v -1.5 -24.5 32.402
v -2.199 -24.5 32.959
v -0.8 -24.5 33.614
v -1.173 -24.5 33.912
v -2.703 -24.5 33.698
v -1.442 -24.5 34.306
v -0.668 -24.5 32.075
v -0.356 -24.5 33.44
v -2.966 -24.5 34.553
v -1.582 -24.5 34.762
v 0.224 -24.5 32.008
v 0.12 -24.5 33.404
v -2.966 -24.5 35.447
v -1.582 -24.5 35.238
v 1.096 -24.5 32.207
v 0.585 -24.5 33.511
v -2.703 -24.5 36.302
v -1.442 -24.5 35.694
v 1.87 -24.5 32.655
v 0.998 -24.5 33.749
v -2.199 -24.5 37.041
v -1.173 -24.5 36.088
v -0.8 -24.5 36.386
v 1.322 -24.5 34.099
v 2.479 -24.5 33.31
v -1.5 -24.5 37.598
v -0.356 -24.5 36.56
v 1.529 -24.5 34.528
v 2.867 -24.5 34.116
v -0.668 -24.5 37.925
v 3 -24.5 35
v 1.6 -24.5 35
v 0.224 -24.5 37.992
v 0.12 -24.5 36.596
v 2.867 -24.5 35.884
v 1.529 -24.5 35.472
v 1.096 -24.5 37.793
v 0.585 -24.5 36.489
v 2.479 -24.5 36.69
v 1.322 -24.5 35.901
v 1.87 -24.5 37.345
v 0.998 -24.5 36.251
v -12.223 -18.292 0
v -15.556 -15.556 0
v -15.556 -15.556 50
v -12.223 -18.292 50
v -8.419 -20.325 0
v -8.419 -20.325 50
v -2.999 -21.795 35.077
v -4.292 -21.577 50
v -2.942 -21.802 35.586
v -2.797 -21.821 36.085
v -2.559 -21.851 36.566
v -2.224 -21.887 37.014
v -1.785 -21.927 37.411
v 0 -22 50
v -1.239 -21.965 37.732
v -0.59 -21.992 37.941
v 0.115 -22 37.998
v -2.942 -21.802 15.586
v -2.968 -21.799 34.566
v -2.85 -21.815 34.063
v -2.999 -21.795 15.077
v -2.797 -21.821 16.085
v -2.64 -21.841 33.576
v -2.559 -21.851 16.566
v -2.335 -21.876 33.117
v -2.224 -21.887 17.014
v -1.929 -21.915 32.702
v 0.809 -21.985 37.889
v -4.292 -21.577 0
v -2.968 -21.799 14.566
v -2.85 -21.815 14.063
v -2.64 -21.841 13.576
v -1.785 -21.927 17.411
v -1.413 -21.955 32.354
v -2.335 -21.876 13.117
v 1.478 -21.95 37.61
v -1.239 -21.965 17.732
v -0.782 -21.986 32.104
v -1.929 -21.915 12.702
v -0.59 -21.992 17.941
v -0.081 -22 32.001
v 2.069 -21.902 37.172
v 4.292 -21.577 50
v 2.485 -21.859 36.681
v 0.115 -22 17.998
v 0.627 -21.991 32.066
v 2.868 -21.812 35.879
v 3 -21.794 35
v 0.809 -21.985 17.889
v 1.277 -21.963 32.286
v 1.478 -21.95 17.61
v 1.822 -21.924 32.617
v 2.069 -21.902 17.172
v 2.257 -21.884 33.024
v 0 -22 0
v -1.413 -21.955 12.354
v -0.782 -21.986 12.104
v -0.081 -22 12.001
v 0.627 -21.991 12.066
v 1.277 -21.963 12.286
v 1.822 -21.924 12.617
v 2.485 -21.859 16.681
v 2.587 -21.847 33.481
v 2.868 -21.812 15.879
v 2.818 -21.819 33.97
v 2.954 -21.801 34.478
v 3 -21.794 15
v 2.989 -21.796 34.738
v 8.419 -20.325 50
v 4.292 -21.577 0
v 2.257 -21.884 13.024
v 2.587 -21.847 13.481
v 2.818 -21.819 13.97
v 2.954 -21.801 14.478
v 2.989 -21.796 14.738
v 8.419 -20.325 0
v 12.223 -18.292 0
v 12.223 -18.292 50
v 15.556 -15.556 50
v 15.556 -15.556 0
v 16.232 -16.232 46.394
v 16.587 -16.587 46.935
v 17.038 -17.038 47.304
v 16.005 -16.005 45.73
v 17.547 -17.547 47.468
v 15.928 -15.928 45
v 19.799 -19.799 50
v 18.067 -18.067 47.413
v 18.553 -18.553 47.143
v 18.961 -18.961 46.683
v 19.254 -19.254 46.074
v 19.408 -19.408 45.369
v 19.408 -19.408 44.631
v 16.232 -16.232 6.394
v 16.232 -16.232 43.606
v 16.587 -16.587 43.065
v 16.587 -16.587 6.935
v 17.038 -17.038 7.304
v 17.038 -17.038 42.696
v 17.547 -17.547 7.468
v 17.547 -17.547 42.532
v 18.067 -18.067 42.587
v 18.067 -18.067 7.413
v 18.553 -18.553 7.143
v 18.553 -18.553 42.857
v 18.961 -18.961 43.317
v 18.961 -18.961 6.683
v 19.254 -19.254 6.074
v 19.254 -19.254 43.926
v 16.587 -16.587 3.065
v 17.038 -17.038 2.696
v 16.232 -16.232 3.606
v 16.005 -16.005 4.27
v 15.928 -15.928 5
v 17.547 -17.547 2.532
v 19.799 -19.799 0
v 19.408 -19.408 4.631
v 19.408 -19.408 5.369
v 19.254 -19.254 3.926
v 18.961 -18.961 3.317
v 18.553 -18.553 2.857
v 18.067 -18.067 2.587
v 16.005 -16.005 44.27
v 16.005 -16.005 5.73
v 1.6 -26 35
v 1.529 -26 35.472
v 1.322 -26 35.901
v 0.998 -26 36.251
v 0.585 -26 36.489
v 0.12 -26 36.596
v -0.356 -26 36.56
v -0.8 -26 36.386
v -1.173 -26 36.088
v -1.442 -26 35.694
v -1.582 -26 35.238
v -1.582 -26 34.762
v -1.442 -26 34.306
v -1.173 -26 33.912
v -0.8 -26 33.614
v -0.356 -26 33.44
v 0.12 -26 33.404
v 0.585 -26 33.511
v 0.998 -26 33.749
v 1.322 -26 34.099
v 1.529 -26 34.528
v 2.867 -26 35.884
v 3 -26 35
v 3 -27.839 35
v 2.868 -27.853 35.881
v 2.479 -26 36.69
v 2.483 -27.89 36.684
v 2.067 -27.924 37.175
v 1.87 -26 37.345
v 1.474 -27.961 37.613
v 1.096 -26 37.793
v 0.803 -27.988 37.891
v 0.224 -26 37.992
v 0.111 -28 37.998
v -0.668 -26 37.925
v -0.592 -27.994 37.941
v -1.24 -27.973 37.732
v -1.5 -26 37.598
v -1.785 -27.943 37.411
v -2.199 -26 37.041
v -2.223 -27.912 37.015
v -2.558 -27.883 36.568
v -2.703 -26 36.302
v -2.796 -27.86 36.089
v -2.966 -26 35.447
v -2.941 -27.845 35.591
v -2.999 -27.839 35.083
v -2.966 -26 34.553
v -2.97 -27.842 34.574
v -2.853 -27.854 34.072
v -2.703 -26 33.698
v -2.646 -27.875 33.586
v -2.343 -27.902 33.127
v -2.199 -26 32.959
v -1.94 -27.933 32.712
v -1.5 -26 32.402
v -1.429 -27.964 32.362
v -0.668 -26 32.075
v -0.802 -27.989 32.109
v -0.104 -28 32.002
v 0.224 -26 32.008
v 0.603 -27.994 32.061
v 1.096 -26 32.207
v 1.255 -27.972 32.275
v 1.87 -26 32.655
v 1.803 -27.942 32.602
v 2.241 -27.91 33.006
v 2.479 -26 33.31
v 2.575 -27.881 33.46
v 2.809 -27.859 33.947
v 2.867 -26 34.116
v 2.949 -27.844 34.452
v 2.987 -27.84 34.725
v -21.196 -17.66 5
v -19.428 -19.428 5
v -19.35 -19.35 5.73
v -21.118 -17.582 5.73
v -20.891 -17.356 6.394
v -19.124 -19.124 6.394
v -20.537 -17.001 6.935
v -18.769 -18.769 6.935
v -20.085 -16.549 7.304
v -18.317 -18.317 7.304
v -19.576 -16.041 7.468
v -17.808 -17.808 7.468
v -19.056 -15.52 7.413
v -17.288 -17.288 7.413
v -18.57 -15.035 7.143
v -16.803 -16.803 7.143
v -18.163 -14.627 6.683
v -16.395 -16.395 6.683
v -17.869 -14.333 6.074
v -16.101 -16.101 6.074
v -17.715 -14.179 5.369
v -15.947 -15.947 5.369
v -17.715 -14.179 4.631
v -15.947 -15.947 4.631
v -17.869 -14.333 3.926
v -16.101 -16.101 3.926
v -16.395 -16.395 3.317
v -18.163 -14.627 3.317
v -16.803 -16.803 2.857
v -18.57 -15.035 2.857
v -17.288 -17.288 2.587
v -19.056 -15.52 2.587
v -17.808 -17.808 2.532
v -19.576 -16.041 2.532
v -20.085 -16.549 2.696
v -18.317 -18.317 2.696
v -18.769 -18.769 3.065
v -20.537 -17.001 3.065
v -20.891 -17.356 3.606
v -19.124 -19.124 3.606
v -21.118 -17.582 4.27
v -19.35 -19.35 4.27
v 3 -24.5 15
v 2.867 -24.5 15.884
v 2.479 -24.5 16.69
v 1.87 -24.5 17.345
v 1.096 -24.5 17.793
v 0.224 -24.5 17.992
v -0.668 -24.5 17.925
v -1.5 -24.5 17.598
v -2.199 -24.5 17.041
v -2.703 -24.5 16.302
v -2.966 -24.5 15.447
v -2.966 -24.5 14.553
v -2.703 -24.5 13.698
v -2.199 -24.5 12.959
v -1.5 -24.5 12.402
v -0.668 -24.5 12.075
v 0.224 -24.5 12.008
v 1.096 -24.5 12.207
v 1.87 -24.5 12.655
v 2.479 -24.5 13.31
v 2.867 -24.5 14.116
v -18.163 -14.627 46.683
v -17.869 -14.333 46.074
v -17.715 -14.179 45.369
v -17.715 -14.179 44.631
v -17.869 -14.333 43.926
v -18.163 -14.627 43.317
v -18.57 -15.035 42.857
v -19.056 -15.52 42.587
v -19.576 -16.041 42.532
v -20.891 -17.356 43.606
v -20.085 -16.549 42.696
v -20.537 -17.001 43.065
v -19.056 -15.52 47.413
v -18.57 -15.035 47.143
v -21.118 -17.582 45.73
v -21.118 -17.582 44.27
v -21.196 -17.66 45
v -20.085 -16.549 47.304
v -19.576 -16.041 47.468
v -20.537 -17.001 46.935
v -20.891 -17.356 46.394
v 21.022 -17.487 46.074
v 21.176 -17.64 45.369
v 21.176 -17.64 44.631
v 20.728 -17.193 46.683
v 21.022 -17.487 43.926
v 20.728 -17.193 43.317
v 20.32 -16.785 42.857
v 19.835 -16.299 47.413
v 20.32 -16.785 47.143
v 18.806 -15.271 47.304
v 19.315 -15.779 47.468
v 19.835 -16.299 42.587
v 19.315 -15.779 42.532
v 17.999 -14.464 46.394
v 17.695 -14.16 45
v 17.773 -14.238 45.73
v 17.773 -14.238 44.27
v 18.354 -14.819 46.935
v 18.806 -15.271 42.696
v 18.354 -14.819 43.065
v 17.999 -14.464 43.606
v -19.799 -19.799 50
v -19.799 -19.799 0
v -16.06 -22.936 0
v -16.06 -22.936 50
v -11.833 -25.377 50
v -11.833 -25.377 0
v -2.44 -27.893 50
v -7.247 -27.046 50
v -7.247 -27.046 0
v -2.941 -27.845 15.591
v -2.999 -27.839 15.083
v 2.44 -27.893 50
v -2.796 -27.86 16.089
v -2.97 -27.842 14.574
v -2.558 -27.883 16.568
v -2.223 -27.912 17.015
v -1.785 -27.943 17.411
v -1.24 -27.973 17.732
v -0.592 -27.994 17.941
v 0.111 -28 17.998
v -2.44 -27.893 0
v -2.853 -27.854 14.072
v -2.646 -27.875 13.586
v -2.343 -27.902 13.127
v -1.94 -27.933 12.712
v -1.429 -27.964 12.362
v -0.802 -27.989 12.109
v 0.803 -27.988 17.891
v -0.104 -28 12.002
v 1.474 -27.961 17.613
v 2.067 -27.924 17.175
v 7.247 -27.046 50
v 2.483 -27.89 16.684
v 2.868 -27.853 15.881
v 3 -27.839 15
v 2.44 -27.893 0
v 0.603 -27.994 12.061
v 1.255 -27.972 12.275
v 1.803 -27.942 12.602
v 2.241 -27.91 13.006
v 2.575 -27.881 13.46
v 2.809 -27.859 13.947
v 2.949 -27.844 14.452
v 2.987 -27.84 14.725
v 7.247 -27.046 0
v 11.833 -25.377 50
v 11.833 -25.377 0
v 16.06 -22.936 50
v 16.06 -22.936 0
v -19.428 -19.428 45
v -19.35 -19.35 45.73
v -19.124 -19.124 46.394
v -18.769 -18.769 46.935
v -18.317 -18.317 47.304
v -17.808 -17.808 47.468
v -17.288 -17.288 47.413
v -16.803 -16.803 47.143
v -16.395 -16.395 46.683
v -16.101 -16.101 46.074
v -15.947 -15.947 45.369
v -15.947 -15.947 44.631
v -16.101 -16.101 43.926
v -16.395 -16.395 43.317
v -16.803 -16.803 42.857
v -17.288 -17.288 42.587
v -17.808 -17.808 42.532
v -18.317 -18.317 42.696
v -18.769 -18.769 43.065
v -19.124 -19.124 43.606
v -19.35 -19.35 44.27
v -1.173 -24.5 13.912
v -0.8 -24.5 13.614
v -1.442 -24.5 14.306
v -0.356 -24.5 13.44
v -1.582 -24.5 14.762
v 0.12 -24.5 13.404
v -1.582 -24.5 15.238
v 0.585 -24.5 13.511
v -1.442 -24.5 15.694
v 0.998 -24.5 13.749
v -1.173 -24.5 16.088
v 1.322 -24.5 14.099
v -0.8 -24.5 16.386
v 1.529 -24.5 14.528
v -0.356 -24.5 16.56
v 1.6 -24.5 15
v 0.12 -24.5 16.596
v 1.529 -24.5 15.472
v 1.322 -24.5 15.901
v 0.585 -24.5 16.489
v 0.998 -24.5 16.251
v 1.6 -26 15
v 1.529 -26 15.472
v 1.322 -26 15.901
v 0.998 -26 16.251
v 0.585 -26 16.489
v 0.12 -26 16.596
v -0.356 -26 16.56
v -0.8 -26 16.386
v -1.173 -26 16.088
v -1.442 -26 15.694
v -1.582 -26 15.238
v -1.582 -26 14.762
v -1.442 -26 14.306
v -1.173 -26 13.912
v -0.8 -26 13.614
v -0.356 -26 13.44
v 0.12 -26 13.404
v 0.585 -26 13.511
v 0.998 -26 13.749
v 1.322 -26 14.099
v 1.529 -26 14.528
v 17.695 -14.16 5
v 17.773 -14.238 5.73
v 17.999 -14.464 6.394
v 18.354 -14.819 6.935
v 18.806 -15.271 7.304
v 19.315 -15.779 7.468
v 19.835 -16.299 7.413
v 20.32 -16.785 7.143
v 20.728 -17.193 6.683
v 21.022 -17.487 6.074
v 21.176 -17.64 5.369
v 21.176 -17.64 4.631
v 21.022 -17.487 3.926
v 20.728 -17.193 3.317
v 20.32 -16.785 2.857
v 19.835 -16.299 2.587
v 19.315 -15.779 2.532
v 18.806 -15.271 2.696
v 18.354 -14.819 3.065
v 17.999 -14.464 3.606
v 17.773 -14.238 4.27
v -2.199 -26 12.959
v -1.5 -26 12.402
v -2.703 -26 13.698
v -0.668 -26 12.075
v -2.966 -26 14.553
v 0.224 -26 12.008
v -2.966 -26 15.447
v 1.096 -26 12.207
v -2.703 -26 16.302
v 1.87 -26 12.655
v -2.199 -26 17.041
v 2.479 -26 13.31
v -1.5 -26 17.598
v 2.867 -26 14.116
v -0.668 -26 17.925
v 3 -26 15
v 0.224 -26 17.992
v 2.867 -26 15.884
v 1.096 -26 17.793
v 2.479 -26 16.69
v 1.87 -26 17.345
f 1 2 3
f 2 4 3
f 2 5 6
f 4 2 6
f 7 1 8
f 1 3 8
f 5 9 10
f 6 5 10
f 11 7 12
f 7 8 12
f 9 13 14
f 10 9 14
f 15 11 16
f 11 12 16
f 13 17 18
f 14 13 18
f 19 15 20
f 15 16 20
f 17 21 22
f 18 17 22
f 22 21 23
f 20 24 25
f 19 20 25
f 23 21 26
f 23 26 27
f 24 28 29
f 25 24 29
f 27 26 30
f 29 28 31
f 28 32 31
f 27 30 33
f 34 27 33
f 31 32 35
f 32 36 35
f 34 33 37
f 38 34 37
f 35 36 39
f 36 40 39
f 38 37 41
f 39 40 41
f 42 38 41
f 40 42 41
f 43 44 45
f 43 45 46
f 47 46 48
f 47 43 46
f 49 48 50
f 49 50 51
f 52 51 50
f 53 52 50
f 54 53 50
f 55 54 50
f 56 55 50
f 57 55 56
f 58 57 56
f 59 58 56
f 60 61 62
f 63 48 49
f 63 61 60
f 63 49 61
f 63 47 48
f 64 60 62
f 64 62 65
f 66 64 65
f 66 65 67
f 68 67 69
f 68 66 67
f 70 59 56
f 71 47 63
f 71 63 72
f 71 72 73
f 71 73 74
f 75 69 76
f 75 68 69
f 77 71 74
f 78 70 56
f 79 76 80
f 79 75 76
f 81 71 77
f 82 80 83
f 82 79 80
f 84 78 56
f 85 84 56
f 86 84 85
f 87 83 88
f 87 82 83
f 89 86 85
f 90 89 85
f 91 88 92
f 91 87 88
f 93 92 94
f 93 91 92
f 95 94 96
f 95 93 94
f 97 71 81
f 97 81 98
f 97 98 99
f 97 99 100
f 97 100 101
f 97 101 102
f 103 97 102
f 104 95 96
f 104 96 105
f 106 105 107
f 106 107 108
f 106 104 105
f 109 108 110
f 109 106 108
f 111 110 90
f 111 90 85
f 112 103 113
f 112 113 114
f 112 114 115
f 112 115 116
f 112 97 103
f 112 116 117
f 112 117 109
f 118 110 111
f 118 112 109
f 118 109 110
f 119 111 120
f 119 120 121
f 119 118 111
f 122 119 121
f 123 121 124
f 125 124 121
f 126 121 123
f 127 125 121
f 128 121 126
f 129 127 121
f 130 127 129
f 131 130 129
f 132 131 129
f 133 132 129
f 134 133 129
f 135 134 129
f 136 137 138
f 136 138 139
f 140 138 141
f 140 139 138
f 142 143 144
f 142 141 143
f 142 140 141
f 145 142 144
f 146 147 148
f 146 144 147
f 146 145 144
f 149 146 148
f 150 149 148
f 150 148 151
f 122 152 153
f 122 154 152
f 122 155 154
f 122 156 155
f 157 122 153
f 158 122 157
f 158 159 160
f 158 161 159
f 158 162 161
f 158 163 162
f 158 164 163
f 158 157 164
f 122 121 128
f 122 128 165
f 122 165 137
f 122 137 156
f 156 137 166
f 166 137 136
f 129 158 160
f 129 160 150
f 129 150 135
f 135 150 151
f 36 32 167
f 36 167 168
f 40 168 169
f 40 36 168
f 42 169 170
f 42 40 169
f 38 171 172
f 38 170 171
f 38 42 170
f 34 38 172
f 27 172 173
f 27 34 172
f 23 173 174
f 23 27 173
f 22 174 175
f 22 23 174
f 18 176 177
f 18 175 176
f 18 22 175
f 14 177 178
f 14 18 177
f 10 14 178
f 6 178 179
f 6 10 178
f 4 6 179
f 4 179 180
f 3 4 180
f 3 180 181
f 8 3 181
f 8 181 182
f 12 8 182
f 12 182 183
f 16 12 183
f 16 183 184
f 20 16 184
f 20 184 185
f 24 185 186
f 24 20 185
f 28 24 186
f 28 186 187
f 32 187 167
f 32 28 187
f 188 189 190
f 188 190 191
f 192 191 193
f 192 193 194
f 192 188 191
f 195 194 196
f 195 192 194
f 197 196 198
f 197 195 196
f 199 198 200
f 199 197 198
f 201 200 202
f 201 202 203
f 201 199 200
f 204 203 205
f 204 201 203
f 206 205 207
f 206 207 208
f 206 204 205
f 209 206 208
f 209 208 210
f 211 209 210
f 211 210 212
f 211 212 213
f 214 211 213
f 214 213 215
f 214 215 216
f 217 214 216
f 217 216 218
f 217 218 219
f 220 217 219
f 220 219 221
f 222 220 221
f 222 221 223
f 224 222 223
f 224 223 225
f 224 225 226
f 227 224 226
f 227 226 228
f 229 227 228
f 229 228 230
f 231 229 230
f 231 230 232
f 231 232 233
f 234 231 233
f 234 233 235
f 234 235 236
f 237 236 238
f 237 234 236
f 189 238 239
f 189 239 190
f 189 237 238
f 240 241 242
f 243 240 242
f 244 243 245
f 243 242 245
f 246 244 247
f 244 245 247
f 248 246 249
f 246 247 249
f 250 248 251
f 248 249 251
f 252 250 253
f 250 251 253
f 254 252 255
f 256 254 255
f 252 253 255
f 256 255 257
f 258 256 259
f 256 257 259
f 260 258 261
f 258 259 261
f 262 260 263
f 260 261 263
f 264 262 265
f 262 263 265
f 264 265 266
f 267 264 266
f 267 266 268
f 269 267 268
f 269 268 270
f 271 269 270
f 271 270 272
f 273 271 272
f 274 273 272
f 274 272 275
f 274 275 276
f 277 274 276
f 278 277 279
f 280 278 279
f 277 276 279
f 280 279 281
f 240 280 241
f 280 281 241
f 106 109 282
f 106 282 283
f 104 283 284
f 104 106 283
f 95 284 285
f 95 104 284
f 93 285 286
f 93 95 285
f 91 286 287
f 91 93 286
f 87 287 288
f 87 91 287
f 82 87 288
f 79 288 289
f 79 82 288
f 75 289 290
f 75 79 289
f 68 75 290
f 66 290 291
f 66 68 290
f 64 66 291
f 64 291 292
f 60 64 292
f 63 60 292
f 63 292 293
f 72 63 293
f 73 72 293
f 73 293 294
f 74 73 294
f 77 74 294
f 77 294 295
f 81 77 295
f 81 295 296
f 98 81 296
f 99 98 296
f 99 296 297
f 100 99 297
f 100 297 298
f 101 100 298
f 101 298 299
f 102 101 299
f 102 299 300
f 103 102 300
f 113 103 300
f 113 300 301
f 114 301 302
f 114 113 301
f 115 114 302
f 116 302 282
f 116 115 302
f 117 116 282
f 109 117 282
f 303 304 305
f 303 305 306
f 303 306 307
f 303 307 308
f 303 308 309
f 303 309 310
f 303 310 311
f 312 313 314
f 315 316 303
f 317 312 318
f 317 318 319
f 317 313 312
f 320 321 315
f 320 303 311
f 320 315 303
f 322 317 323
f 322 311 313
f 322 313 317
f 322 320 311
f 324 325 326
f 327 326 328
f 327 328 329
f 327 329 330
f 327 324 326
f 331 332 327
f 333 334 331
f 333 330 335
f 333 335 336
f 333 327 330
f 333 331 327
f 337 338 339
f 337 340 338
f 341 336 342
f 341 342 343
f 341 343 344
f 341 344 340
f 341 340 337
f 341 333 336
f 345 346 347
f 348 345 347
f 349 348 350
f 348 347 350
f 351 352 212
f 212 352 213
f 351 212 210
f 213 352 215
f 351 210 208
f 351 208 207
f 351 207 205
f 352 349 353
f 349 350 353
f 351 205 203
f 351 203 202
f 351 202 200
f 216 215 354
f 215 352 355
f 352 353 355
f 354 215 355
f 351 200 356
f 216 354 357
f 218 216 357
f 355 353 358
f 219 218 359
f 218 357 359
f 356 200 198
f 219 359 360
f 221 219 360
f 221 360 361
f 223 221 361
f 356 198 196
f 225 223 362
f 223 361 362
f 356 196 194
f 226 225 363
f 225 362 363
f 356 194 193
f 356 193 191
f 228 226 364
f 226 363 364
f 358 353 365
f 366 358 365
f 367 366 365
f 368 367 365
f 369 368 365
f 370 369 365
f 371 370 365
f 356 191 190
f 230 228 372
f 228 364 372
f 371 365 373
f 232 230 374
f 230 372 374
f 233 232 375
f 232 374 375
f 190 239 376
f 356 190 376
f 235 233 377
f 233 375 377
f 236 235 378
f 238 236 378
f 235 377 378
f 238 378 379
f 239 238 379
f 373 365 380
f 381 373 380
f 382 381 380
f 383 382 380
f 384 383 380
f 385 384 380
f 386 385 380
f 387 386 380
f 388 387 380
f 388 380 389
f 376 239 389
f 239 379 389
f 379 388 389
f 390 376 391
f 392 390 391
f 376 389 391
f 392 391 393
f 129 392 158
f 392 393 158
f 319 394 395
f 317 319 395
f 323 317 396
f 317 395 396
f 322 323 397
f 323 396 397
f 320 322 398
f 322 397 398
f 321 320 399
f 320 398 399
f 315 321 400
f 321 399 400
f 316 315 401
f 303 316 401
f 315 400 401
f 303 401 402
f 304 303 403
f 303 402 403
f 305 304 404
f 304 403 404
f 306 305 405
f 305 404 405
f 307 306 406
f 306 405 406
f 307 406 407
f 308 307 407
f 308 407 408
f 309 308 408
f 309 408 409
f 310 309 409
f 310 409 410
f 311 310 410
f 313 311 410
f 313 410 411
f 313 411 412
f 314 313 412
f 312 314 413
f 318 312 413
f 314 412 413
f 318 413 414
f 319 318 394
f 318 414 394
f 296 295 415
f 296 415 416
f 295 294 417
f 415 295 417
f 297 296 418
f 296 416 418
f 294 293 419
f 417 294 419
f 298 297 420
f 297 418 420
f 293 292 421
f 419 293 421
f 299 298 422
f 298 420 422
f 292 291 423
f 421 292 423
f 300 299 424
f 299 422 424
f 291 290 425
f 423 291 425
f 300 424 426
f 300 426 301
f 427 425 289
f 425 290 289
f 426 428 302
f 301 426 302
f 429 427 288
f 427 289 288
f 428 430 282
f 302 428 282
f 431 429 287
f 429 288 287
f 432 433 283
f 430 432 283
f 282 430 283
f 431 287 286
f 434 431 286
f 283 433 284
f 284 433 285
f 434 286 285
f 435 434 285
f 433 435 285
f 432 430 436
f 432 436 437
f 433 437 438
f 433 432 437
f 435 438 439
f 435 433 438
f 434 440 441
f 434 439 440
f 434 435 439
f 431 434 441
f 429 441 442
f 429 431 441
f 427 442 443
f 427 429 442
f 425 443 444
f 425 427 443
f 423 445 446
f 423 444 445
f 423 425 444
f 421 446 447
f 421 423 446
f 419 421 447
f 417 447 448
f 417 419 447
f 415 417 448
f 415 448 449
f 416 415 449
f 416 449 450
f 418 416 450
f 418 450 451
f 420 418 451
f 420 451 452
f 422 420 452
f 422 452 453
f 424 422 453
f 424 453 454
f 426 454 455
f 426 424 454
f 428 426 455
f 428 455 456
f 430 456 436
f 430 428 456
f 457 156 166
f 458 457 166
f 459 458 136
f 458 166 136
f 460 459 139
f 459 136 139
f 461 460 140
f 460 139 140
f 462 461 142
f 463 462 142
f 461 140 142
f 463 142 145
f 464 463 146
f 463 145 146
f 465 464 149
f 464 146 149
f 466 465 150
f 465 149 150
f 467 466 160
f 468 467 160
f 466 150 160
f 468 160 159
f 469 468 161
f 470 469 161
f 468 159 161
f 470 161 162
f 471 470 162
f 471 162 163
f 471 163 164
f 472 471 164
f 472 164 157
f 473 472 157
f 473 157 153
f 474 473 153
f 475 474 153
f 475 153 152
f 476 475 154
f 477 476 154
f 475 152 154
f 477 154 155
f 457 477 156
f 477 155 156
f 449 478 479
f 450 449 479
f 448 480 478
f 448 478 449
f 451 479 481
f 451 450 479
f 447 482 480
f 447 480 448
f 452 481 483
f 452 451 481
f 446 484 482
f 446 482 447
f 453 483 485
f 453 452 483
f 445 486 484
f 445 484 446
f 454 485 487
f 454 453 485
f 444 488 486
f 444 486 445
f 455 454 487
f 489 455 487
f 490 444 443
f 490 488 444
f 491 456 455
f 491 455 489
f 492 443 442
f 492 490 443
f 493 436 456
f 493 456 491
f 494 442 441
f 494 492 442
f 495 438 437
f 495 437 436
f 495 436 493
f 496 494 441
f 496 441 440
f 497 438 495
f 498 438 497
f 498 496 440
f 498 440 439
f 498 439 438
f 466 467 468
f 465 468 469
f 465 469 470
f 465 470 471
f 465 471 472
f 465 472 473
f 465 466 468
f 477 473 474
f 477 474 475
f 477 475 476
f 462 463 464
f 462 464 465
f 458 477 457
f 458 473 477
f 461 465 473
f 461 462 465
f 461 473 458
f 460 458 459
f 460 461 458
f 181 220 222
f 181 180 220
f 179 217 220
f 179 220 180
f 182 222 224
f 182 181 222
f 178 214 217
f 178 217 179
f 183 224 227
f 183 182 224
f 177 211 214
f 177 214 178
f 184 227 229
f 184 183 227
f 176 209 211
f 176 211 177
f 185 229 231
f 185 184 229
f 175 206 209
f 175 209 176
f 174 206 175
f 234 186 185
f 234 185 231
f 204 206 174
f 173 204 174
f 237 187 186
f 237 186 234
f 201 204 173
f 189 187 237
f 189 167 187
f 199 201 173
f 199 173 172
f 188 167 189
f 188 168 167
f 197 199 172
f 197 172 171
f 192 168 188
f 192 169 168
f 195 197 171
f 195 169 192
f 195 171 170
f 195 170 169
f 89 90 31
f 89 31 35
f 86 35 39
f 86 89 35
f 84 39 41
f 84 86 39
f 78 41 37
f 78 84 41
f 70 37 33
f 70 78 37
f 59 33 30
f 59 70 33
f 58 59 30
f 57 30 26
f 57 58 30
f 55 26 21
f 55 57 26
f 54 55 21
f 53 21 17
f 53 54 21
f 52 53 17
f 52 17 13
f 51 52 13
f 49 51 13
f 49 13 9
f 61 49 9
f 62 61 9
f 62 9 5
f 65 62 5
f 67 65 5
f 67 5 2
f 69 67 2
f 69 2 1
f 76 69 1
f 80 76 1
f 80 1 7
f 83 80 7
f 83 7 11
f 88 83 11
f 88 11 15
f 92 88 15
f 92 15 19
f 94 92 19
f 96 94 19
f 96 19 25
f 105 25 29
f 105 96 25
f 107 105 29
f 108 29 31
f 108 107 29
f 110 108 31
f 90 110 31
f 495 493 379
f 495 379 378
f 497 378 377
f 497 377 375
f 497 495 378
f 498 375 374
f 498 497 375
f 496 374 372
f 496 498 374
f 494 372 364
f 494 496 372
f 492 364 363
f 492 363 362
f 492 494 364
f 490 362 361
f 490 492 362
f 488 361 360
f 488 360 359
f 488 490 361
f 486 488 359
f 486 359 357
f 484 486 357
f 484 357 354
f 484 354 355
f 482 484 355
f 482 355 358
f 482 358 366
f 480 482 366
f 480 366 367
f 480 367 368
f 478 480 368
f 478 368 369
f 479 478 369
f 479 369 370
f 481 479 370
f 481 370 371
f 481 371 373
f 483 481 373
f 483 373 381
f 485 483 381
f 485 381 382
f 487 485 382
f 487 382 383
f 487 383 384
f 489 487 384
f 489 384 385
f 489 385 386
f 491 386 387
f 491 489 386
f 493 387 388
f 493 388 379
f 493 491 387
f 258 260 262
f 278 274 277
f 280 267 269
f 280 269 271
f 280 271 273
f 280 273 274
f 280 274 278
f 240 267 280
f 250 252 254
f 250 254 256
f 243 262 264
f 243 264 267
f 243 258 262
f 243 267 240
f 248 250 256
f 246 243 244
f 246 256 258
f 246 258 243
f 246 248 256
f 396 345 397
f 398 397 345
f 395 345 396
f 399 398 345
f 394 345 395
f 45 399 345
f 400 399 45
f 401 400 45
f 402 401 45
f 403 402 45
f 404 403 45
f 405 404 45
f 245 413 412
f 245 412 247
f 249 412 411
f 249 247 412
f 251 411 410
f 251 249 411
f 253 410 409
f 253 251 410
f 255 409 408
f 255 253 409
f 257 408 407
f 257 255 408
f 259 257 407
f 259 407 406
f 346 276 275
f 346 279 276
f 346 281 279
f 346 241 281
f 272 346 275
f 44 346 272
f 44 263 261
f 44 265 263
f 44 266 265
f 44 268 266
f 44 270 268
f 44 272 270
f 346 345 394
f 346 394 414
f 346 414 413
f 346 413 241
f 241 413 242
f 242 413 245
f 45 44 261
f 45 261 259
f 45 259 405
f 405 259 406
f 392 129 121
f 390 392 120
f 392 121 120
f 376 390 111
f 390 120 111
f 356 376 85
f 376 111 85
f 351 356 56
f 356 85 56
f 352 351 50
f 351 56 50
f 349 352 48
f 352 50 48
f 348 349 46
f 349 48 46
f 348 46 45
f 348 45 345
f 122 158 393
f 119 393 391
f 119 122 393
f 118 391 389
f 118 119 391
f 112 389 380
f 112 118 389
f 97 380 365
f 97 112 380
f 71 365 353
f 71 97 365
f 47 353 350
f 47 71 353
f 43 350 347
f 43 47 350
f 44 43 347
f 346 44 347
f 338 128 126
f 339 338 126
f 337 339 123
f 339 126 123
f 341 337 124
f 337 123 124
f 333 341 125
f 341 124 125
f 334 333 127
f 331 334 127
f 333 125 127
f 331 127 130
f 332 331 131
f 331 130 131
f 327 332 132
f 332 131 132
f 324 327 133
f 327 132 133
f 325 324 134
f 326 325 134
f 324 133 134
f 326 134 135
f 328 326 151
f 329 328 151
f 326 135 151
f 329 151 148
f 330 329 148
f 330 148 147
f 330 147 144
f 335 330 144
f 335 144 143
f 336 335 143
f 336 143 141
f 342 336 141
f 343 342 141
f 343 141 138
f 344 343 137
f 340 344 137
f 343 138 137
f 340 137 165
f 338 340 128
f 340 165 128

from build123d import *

# Parameters (mm, degrees)
PAD_DEPTH            = 50
SKETCH001_R          = 2.475
PAD001_DEPTH         = 2.5
SKETCH002_R          = 2.475
PAD002_DEPTH         = 2.5
SKETCH003_R          = 3
POCKET_DEPTH         = 24.5
SKETCH004_R          = 1.6
POCKET001_DEPTH      = 0.001
POCKET001_DEPTH_BACK = 28.001
POCKET002_START      = 26
SKETCH005_R          = 3
POCKET002_DEPTH      = 42


with BuildPart() as part:
    # Sketch → Pad (new body)
    with BuildSketch(Plane.XY):
        with BuildLine():
            ThreePointArc((-15.556349, -15.556349), (0, -22), (15.556349, -15.556349))
            Line((15.556349, -15.556349), (19.79899, -19.79899))
            ThreePointArc((-19.79899, -19.79899), (0, -28), (19.79899, -19.79899))
            Line((-19.79899, -19.79899), (-15.556349, -15.556349))
        make_face()
    extrude(amount=PAD_DEPTH)

    # Sketch001 → Pad001 (join)
    with BuildSketch(Plane(origin=(0, 0, 0), x_dir=(-0.707107, -0.707107, 0), z_dir=(-0.707107, 0.707107, 0))):
        with Locations((25, 45)):
            Circle(SKETCH001_R)
        with Locations((25, 5)):
            Circle(SKETCH001_R)
    extrude(amount=PAD001_DEPTH)

    # Sketch002 (on Face8 of Pad001) → Pad002 (join)
    with BuildSketch(Plane(origin=(0, 0, 0), x_dir=(-0.707107, 0.707107, 0), z_dir=(0.707107, 0.707107, 0))):
        with Locations((-25, 45)):
            Circle(SKETCH002_R)
        with Locations((-25, 5)):
            Circle(SKETCH002_R)
    extrude(amount=PAD002_DEPTH)

    # Sketch003 → Pocket (cut)
    with BuildSketch(Plane.XZ):
        with Locations((0, 35)):
            Circle(SKETCH003_R)
        with Locations((0, 15)):
            Circle(SKETCH003_R)
    extrude(amount=POCKET_DEPTH, mode=Mode.SUBTRACT)

    # Sketch004 → Pocket001 (cut, two sides)
    with BuildSketch(Plane.XZ) as pocket001_sk:
        with Locations((0, 35)):
            Circle(SKETCH004_R)
        with Locations((0, 15)):
            Circle(SKETCH004_R)
    extrude(amount=-POCKET001_DEPTH, mode=Mode.SUBTRACT)
    extrude(pocket001_sk.sketch, amount=POCKET001_DEPTH_BACK, mode=Mode.SUBTRACT)

    # Sketch005 → Pocket002 (cut)
    with BuildSketch(Plane.XZ.offset(POCKET002_START)):
        with Locations((0, 35)):
            Circle(SKETCH005_R)
        with Locations((0, 15)):
            Circle(SKETCH005_R)
    extrude(amount=POCKET002_DEPTH, mode=Mode.SUBTRACT)


solid = part.part
